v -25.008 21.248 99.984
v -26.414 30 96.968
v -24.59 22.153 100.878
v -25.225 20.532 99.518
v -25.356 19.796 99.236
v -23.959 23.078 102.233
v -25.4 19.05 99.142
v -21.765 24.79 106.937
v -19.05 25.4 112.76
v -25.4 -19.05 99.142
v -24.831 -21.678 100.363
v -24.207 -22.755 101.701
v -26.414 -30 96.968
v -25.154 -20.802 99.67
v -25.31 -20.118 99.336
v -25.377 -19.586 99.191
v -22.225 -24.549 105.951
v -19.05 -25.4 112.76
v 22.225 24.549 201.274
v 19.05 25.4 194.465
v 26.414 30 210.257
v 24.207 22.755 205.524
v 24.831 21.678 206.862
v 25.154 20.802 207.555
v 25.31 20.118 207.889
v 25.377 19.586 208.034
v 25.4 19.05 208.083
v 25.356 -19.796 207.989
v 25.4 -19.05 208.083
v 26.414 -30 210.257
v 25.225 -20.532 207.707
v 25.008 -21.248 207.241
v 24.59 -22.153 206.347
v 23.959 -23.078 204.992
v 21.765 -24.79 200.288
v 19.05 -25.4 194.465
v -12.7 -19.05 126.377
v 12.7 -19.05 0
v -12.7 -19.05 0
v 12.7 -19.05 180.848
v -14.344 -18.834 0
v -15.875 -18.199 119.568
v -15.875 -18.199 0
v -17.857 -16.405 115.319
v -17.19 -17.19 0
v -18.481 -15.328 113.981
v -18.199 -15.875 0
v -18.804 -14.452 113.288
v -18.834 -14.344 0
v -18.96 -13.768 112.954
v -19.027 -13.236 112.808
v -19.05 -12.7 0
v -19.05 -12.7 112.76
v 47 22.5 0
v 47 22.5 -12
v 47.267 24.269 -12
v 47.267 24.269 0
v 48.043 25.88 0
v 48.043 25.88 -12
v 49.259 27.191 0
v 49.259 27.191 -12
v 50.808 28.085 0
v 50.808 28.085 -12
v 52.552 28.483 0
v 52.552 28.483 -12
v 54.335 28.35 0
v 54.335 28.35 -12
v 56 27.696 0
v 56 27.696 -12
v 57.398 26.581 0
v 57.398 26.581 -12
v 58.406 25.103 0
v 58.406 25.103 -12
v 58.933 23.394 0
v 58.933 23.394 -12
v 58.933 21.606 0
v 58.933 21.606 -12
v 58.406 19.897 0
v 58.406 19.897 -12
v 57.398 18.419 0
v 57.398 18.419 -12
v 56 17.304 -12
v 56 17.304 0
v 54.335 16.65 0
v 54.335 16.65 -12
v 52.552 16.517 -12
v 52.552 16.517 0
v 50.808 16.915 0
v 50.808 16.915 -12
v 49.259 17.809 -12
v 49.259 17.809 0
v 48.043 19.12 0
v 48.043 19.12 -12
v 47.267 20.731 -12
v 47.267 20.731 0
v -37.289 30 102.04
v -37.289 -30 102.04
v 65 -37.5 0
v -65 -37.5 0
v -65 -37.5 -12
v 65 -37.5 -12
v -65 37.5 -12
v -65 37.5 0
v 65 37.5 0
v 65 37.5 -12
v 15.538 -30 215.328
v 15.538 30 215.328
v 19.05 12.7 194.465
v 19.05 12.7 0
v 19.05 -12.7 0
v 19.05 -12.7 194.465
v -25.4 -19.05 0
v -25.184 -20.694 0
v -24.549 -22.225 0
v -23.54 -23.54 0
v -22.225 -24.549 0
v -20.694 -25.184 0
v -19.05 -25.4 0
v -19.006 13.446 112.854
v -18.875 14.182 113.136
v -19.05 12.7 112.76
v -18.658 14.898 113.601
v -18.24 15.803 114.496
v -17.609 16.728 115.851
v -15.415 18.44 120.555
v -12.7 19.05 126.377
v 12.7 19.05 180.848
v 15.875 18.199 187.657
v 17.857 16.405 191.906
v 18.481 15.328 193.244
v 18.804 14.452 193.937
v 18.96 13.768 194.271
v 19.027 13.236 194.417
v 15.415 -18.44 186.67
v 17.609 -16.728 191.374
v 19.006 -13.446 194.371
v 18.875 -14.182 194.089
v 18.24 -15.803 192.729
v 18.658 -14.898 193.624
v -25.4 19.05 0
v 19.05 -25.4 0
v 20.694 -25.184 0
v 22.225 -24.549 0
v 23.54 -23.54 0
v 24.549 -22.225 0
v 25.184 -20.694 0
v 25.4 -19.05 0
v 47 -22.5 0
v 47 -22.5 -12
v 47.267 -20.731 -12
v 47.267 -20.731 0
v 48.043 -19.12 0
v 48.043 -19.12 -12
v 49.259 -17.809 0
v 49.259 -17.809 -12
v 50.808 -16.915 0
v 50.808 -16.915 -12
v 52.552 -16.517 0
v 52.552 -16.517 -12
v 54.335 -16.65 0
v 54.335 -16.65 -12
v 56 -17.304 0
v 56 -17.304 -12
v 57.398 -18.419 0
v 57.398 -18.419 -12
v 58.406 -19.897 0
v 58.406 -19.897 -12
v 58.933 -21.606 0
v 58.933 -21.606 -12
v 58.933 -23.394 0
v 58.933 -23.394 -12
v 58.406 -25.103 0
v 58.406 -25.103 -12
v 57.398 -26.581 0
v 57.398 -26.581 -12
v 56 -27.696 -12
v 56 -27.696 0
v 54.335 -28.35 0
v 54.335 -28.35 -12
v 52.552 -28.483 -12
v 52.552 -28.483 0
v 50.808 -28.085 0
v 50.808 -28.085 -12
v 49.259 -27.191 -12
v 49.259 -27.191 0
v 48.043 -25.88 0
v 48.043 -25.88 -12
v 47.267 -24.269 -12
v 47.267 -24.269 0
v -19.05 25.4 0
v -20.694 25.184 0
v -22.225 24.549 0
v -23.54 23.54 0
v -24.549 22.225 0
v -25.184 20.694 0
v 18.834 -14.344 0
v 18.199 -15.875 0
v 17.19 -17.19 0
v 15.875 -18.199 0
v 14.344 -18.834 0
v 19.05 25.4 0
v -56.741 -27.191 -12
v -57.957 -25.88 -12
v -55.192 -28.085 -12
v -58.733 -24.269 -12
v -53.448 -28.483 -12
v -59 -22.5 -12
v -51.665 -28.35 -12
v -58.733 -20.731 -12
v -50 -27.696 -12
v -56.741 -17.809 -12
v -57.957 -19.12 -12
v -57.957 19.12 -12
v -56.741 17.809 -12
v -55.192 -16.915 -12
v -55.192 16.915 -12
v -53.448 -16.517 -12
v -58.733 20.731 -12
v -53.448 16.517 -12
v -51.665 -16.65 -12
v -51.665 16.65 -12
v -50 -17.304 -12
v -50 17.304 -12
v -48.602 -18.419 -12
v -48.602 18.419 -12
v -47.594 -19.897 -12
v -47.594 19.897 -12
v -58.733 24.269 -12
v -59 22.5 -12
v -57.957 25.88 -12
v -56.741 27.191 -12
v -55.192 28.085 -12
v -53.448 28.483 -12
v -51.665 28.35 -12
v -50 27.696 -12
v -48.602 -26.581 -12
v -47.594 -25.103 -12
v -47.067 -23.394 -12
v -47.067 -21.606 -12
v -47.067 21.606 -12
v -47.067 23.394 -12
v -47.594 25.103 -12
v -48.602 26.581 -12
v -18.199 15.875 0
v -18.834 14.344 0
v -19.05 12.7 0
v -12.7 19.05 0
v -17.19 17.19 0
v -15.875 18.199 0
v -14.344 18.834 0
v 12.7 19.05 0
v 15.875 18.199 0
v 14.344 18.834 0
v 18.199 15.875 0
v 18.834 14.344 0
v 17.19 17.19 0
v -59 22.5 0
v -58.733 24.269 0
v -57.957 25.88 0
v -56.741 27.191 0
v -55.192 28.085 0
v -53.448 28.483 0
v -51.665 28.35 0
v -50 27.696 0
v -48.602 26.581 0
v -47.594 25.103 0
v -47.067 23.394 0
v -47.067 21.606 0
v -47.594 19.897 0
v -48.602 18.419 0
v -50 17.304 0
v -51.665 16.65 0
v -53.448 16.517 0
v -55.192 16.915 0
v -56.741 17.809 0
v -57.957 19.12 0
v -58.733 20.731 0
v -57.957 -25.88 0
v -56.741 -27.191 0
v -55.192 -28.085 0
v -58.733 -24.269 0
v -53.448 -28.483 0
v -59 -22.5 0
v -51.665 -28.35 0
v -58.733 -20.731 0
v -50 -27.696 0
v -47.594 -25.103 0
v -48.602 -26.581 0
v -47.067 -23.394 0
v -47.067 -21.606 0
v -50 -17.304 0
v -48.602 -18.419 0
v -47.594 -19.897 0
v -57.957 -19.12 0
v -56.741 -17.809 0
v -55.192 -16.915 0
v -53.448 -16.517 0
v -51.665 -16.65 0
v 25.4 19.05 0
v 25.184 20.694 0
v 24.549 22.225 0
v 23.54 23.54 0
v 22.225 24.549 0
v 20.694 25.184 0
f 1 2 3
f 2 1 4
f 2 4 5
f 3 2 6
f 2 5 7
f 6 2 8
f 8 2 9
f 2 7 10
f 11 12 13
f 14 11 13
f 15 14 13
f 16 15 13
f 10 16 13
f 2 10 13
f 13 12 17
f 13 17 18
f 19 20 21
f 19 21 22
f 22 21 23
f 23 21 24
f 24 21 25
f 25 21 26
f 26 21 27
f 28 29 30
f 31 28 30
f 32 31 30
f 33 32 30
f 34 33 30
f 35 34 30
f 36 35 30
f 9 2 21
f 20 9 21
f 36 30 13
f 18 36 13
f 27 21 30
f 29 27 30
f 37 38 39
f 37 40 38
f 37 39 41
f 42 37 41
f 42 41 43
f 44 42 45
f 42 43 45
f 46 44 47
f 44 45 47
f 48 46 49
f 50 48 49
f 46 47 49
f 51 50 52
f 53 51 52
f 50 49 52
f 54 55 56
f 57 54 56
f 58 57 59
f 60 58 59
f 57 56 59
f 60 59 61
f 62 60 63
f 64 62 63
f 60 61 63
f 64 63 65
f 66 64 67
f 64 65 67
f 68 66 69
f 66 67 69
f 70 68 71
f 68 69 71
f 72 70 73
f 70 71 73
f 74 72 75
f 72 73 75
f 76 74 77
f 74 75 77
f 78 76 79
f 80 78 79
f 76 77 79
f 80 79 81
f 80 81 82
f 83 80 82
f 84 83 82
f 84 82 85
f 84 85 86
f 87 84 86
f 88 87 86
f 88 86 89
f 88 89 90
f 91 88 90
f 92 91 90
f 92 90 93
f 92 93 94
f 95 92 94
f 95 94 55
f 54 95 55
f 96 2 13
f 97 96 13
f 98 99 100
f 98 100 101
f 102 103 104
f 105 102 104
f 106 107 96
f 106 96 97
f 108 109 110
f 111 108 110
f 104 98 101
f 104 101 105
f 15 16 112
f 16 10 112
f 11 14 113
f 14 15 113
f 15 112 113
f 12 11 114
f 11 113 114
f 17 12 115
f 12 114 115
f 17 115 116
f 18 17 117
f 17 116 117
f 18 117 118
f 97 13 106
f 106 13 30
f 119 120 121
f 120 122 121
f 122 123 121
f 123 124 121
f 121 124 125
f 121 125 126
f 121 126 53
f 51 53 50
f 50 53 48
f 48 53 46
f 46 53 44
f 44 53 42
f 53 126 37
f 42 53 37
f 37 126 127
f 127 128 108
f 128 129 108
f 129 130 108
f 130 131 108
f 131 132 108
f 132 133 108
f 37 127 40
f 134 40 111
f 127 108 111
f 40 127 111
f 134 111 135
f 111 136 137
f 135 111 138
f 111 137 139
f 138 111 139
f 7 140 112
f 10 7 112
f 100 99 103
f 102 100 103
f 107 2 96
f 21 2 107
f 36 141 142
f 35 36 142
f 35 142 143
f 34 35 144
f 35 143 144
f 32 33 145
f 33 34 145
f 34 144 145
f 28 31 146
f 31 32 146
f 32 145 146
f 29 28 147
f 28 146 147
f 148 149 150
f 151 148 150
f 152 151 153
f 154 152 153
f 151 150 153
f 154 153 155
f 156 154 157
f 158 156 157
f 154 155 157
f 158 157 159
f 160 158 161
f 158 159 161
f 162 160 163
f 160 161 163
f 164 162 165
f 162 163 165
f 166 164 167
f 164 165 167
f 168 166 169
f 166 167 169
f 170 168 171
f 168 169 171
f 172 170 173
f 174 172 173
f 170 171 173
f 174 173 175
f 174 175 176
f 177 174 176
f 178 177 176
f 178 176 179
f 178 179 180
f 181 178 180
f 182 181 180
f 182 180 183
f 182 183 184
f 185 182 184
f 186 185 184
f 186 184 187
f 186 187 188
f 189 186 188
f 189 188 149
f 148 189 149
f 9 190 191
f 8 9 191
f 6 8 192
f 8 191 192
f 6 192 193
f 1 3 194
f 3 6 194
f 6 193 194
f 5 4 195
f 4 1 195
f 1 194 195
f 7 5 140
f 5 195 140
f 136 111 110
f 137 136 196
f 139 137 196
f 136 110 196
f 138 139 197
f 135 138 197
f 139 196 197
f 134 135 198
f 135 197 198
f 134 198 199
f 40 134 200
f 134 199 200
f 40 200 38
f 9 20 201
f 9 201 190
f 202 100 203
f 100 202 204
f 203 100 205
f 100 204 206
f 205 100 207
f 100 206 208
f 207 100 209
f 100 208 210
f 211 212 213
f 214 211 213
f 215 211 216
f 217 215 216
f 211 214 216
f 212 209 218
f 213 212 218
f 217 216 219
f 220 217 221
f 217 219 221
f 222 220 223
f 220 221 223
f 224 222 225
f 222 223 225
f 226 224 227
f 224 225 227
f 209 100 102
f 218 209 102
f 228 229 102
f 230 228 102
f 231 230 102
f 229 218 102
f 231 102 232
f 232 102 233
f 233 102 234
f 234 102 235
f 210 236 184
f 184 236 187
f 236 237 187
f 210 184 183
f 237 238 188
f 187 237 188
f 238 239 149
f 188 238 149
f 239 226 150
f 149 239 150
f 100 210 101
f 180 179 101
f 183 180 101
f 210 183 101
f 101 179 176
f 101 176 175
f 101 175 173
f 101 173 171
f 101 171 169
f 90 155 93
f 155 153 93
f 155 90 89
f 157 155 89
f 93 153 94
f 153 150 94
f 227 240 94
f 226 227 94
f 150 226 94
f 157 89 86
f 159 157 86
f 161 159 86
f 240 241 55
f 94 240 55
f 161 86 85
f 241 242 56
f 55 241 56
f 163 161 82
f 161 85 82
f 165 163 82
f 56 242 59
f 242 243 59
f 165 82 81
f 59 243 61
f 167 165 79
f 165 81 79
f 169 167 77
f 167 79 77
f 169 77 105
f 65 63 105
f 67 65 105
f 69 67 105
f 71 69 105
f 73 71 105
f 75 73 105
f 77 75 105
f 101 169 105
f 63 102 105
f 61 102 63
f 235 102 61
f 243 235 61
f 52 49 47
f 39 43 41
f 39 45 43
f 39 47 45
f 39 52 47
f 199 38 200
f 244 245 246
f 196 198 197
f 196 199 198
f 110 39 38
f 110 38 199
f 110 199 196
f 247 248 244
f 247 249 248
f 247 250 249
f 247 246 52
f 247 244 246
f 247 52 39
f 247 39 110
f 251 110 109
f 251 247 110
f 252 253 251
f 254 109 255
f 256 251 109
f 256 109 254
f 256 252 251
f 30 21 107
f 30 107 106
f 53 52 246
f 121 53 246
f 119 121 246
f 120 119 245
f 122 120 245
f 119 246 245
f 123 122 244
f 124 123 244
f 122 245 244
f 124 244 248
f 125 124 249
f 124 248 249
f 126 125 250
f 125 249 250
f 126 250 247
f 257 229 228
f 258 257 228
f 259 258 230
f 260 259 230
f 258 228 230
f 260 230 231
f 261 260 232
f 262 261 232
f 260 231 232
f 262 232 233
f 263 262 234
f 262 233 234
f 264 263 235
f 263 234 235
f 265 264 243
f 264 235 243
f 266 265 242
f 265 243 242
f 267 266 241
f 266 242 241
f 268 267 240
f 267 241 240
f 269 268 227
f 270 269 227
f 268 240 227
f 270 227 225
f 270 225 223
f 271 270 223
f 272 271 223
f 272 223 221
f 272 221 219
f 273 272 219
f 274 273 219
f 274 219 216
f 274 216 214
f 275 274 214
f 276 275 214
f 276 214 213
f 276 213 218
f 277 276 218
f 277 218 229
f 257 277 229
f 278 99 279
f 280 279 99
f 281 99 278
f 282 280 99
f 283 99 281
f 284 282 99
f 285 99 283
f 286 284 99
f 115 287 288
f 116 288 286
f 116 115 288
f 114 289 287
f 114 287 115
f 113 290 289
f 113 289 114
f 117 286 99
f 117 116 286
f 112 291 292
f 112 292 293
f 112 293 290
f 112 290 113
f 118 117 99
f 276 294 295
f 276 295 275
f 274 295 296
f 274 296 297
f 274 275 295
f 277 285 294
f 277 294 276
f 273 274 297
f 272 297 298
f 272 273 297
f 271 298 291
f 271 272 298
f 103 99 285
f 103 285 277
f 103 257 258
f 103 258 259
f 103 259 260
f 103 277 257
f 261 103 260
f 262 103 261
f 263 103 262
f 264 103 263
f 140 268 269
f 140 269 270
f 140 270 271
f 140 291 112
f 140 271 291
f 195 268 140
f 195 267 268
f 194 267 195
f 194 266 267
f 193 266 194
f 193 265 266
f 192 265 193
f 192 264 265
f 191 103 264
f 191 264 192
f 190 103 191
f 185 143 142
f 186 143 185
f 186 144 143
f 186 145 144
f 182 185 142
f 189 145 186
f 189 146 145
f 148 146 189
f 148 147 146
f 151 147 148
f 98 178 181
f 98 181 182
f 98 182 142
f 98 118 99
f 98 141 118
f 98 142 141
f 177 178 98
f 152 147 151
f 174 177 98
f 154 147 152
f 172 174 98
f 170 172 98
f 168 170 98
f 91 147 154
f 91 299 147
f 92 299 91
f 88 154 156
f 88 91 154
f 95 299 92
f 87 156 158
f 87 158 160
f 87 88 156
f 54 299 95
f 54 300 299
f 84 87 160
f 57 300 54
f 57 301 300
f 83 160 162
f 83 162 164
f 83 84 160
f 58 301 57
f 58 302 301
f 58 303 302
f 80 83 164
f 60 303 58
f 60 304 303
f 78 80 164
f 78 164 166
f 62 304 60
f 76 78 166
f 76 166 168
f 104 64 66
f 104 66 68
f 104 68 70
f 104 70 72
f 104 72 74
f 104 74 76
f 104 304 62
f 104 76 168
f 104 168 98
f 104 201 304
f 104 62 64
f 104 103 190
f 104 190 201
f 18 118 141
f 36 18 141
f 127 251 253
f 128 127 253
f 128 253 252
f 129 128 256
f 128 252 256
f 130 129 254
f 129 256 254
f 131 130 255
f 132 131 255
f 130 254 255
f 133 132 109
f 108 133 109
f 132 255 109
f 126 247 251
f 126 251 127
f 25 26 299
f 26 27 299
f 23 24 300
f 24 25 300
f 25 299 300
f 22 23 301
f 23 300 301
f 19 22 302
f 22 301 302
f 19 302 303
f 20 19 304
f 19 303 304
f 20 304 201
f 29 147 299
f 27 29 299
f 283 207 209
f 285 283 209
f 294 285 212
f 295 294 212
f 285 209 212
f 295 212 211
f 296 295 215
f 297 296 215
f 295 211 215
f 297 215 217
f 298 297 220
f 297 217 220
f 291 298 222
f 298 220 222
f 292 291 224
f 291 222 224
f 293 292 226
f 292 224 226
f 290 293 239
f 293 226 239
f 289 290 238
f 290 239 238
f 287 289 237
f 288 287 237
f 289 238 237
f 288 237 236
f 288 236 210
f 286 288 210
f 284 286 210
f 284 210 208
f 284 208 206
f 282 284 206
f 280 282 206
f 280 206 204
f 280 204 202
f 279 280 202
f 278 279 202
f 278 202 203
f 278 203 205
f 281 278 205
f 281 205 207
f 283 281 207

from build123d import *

# Parameters (mm, degrees)
F0_W     = 130
F0_H     = 75
F1_DEPTH = 12
F3_DEPTH = 208.083
F5_D     = 12
F7_DEPTH = 50.8
F8_W     = 60
F8_H     = 125
F9_DEPTH = 12


with BuildPart() as f1:
    # F0 (on Top) → F1 (new body)
    with BuildSketch(Plane.XY):
        Rectangle(F0_W, F0_H)
    extrude(amount=-F1_DEPTH)

    # F2 (on face) → F3 (join)
    with BuildSketch(Plane.XY):
        with BuildLine():
            Line((-19.05, -25.4), (19.05, -25.4))
            ThreePointArc((19.05, -25.4), (23.5401280605, -23.5401280605), (25.4, -19.05))
            Line((25.4, -19.05), (25.4, 19.05))
            ThreePointArc((25.4, 19.05), (23.5401280605, 23.5401280605), (19.05, 25.4))
            Line((19.05, 25.4), (-19.05, 25.4))
            ThreePointArc((-19.05, 25.4), (-23.5401280605, 23.5401280605), (-25.4, 19.05))
            Line((-25.4, 19.05), (-25.4, -19.05))
            ThreePointArc((-25.4, -19.05), (-23.5401280605, -23.5401280605), (-19.05, -25.4))
        make_face()
        with BuildLine():
            Line((-12.7, 19.05), (12.7, 19.05))
            ThreePointArc((12.7, 19.05), (17.1901280605, 17.1901280605), (19.05, 12.7))
            Line((19.05, 12.7), (19.05, -12.7))
            ThreePointArc((19.05, -12.7), (17.1901280605, -17.1901280605), (12.7, -19.05))
            Line((12.7, -19.05), (-12.7, -19.05))
            ThreePointArc((-12.7, -19.05), (-17.1901280605, -17.1901280605), (-19.05, -12.7))
            Line((-19.05, -12.7), (-19.05, 12.7))
            ThreePointArc((-19.05, 12.7), (-17.1901280605, 17.1901280605), (-12.7, 19.05))
        make_face(mode=Mode.SUBTRACT)
    extrude(amount=F3_DEPTH)

    # F5 (through all)
    with Locations(Plane.XY):
        with Locations((-53, 22.5), (53, 22.5), (53, -22.5), (-53, -22.5)):
            Hole(F5_D / 2)

    # F6 (on face) → F7 (cut)
    with BuildSketch(Plane.XZ.offset(25.4)):
        Polygon((19.05, 208.083), (-19.05, 208.083), (-19.05, 112.7596673834), (19.05, 194.4653810548), align=None)
        Polygon((25.4, 208.083), (19.05, 208.083), (19.05, 194.4653810548), align=None)
        Polygon((-19.05, 112.7596673834), (-19.05, 208.083), (-25.4, 208.083), (-25.4, 99.1420484381), align=None)
    extrude(amount=-F7_DEPTH, mode=Mode.SUBTRACT)

    # F8 (on face) → F9 (join)
    with BuildSketch(Plane(origin=(-58.8370102857, 0, 27.4361484792), x_dir=(0, -1, 0), z_dir=(-0.906307787, 0, 0.4226182617))):
        with Locations((0, 139.2202268861)):
            Rectangle(F8_W, F8_H)
        with BuildLine():
            Line((25.4, 184.2963670451), (25.4, 94.144086727))
            add(Edge.make_bspline(
                [(25.4, 94.144086727), (25.4, 79.118706674), (19.05, 79.118706674)],
                knots=[4.7123889804, 4.7123889804, 4.7123889804, 6.2831853072, 6.2831853072, 6.2831853072], degree=2, weights=[1, 0.7071067812, 1]))
            Line((19.05, 79.118706674), (-19.05, 79.118706674))
            add(Edge.make_bspline(
                [(-19.05, 79.118706674), (-25.4, 79.118706674), (-25.4, 94.144086727)],
                knots=[0, 0, 0, 1.5707963268, 1.5707963268, 1.5707963268], degree=2, weights=[1, 0.7071067812, 1]))
            Line((-25.4, 94.144086727), (-25.4, 184.2963670451))
            add(Edge.make_bspline(
                [(-25.4, 184.2963670451), (-25.4, 199.3217470982), (-19.05, 199.3217470982)],
                knots=[1.5707963268, 1.5707963268, 1.5707963268, 3.1415926536, 3.1415926536, 3.1415926536], degree=2, weights=[1, 0.7071067812, 1]))
            Line((-19.05, 199.3217470982), (19.05, 199.3217470982))
            add(Edge.make_bspline(
                [(19.05, 199.3217470982), (25.4, 199.3217470982), (25.4, 184.2963670451)],
                knots=[3.1415926536, 3.1415926536, 3.1415926536, 4.7123889804, 4.7123889804, 4.7123889804], degree=2, weights=[1, 0.7071067812, 1]))
        make_face(mode=Mode.SUBTRACT)
        with BuildLine():
            add(Edge.make_bspline(
                [(25.4, 94.144086727), (25.4, 79.118706674), (19.05, 79.118706674)],
                knots=[4.7123889804, 4.7123889804, 4.7123889804, 6.2831853072, 6.2831853072, 6.2831853072], degree=2, weights=[1, 0.7071067812, 1]))
            Line((25.4, 94.144086727), (25.4, 184.2963670451))
            add(Edge.make_bspline(
                [(19.05, 199.3217470982), (25.4, 199.3217470982), (25.4, 184.2963670451)],
                knots=[3.1415926536, 3.1415926536, 3.1415926536, 4.7123889804, 4.7123889804, 4.7123889804], degree=2, weights=[1, 0.7071067812, 1]))
            Line((19.05, 199.3217470982), (-19.05, 199.3217470982))
            add(Edge.make_bspline(
                [(-25.4, 184.2963670451), (-25.4, 199.3217470982), (-19.05, 199.3217470982)],
                knots=[1.5707963268, 1.5707963268, 1.5707963268, 3.1415926536, 3.1415926536, 3.1415926536], degree=2, weights=[1, 0.7071067812, 1]))
            Line((-25.4, 184.2963670451), (-25.4, 94.144086727))
            add(Edge.make_bspline(
                [(-19.05, 79.118706674), (-25.4, 79.118706674), (-25.4, 94.144086727)],
                knots=[0, 0, 0, 1.5707963268, 1.5707963268, 1.5707963268], degree=2, weights=[1, 0.7071067812, 1]))
            Line((-19.05, 79.118706674), (19.05, 79.118706674))
        make_face()
        with BuildLine():
            Line((12.7, 94.144086727), (-12.7, 94.144086727))
            add(Edge.make_bspline(
                [(-12.7, 94.144086727), (-19.05, 94.144086727), (-19.05, 109.1694667801)],
                knots=[0, 0, 0, 1.5707963268, 1.5707963268, 1.5707963268], degree=2, weights=[1, 0.7071067812, 1]))
            Line((-19.05, 109.1694667801), (-19.05, 169.2709869921))
            add(Edge.make_bspline(
                [(-19.05, 169.2709869921), (-19.05, 184.2963670451), (-12.7, 184.2963670451)],
                knots=[1.5707963268, 1.5707963268, 1.5707963268, 3.1415926536, 3.1415926536, 3.1415926536], degree=2, weights=[1, 0.7071067812, 1]))
            Line((-12.7, 184.2963670451), (12.7, 184.2963670451))
            add(Edge.make_bspline(
                [(12.7, 184.2963670451), (19.05, 184.2963670451), (19.05, 169.2709869921)],
                knots=[3.1415926536, 3.1415926536, 3.1415926536, 4.7123889804, 4.7123889804, 4.7123889804], degree=2, weights=[1, 0.7071067812, 1]))
            Line((19.05, 169.2709869921), (19.05, 109.1694667801))
            add(Edge.make_bspline(
                [(19.05, 109.1694667801), (19.05, 94.144086727), (12.7, 94.144086727)],
                knots=[4.7123889804, 4.7123889804, 4.7123889804, 6.2831853072, 6.2831853072, 6.2831853072], degree=2, weights=[1, 0.7071067812, 1]))
        make_face(mode=Mode.SUBTRACT)
        with BuildLine():
            add(Edge.make_bspline(
                [(-12.7, 94.144086727), (-19.05, 94.144086727), (-19.05, 109.1694667801)],
                knots=[0, 0, 0, 1.5707963268, 1.5707963268, 1.5707963268], degree=2, weights=[1, 0.7071067812, 1]))
            Line((-12.7, 94.144086727), (12.7, 94.144086727))
            add(Edge.make_bspline(
                [(19.05, 109.1694667801), (19.05, 94.144086727), (12.7, 94.144086727)],
                knots=[4.7123889804, 4.7123889804, 4.7123889804, 6.2831853072, 6.2831853072, 6.2831853072], degree=2, weights=[1, 0.7071067812, 1]))
            Line((19.05, 109.1694667801), (19.05, 169.2709869921))
            add(Edge.make_bspline(
                [(12.7, 184.2963670451), (19.05, 184.2963670451), (19.05, 169.2709869921)],
                knots=[3.1415926536, 3.1415926536, 3.1415926536, 4.7123889804, 4.7123889804, 4.7123889804], degree=2, weights=[1, 0.7071067812, 1]))
            Line((12.7, 184.2963670451), (-12.7, 184.2963670451))
            add(Edge.make_bspline(
                [(-19.05, 169.2709869921), (-19.05, 184.2963670451), (-12.7, 184.2963670451)],
                knots=[1.5707963268, 1.5707963268, 1.5707963268, 3.1415926536, 3.1415926536, 3.1415926536], degree=2, weights=[1, 0.7071067812, 1]))
            Line((-19.05, 169.2709869921), (-19.05, 109.1694667801))
        make_face()
    extrude(amount=F9_DEPTH)


solid = f1.part
